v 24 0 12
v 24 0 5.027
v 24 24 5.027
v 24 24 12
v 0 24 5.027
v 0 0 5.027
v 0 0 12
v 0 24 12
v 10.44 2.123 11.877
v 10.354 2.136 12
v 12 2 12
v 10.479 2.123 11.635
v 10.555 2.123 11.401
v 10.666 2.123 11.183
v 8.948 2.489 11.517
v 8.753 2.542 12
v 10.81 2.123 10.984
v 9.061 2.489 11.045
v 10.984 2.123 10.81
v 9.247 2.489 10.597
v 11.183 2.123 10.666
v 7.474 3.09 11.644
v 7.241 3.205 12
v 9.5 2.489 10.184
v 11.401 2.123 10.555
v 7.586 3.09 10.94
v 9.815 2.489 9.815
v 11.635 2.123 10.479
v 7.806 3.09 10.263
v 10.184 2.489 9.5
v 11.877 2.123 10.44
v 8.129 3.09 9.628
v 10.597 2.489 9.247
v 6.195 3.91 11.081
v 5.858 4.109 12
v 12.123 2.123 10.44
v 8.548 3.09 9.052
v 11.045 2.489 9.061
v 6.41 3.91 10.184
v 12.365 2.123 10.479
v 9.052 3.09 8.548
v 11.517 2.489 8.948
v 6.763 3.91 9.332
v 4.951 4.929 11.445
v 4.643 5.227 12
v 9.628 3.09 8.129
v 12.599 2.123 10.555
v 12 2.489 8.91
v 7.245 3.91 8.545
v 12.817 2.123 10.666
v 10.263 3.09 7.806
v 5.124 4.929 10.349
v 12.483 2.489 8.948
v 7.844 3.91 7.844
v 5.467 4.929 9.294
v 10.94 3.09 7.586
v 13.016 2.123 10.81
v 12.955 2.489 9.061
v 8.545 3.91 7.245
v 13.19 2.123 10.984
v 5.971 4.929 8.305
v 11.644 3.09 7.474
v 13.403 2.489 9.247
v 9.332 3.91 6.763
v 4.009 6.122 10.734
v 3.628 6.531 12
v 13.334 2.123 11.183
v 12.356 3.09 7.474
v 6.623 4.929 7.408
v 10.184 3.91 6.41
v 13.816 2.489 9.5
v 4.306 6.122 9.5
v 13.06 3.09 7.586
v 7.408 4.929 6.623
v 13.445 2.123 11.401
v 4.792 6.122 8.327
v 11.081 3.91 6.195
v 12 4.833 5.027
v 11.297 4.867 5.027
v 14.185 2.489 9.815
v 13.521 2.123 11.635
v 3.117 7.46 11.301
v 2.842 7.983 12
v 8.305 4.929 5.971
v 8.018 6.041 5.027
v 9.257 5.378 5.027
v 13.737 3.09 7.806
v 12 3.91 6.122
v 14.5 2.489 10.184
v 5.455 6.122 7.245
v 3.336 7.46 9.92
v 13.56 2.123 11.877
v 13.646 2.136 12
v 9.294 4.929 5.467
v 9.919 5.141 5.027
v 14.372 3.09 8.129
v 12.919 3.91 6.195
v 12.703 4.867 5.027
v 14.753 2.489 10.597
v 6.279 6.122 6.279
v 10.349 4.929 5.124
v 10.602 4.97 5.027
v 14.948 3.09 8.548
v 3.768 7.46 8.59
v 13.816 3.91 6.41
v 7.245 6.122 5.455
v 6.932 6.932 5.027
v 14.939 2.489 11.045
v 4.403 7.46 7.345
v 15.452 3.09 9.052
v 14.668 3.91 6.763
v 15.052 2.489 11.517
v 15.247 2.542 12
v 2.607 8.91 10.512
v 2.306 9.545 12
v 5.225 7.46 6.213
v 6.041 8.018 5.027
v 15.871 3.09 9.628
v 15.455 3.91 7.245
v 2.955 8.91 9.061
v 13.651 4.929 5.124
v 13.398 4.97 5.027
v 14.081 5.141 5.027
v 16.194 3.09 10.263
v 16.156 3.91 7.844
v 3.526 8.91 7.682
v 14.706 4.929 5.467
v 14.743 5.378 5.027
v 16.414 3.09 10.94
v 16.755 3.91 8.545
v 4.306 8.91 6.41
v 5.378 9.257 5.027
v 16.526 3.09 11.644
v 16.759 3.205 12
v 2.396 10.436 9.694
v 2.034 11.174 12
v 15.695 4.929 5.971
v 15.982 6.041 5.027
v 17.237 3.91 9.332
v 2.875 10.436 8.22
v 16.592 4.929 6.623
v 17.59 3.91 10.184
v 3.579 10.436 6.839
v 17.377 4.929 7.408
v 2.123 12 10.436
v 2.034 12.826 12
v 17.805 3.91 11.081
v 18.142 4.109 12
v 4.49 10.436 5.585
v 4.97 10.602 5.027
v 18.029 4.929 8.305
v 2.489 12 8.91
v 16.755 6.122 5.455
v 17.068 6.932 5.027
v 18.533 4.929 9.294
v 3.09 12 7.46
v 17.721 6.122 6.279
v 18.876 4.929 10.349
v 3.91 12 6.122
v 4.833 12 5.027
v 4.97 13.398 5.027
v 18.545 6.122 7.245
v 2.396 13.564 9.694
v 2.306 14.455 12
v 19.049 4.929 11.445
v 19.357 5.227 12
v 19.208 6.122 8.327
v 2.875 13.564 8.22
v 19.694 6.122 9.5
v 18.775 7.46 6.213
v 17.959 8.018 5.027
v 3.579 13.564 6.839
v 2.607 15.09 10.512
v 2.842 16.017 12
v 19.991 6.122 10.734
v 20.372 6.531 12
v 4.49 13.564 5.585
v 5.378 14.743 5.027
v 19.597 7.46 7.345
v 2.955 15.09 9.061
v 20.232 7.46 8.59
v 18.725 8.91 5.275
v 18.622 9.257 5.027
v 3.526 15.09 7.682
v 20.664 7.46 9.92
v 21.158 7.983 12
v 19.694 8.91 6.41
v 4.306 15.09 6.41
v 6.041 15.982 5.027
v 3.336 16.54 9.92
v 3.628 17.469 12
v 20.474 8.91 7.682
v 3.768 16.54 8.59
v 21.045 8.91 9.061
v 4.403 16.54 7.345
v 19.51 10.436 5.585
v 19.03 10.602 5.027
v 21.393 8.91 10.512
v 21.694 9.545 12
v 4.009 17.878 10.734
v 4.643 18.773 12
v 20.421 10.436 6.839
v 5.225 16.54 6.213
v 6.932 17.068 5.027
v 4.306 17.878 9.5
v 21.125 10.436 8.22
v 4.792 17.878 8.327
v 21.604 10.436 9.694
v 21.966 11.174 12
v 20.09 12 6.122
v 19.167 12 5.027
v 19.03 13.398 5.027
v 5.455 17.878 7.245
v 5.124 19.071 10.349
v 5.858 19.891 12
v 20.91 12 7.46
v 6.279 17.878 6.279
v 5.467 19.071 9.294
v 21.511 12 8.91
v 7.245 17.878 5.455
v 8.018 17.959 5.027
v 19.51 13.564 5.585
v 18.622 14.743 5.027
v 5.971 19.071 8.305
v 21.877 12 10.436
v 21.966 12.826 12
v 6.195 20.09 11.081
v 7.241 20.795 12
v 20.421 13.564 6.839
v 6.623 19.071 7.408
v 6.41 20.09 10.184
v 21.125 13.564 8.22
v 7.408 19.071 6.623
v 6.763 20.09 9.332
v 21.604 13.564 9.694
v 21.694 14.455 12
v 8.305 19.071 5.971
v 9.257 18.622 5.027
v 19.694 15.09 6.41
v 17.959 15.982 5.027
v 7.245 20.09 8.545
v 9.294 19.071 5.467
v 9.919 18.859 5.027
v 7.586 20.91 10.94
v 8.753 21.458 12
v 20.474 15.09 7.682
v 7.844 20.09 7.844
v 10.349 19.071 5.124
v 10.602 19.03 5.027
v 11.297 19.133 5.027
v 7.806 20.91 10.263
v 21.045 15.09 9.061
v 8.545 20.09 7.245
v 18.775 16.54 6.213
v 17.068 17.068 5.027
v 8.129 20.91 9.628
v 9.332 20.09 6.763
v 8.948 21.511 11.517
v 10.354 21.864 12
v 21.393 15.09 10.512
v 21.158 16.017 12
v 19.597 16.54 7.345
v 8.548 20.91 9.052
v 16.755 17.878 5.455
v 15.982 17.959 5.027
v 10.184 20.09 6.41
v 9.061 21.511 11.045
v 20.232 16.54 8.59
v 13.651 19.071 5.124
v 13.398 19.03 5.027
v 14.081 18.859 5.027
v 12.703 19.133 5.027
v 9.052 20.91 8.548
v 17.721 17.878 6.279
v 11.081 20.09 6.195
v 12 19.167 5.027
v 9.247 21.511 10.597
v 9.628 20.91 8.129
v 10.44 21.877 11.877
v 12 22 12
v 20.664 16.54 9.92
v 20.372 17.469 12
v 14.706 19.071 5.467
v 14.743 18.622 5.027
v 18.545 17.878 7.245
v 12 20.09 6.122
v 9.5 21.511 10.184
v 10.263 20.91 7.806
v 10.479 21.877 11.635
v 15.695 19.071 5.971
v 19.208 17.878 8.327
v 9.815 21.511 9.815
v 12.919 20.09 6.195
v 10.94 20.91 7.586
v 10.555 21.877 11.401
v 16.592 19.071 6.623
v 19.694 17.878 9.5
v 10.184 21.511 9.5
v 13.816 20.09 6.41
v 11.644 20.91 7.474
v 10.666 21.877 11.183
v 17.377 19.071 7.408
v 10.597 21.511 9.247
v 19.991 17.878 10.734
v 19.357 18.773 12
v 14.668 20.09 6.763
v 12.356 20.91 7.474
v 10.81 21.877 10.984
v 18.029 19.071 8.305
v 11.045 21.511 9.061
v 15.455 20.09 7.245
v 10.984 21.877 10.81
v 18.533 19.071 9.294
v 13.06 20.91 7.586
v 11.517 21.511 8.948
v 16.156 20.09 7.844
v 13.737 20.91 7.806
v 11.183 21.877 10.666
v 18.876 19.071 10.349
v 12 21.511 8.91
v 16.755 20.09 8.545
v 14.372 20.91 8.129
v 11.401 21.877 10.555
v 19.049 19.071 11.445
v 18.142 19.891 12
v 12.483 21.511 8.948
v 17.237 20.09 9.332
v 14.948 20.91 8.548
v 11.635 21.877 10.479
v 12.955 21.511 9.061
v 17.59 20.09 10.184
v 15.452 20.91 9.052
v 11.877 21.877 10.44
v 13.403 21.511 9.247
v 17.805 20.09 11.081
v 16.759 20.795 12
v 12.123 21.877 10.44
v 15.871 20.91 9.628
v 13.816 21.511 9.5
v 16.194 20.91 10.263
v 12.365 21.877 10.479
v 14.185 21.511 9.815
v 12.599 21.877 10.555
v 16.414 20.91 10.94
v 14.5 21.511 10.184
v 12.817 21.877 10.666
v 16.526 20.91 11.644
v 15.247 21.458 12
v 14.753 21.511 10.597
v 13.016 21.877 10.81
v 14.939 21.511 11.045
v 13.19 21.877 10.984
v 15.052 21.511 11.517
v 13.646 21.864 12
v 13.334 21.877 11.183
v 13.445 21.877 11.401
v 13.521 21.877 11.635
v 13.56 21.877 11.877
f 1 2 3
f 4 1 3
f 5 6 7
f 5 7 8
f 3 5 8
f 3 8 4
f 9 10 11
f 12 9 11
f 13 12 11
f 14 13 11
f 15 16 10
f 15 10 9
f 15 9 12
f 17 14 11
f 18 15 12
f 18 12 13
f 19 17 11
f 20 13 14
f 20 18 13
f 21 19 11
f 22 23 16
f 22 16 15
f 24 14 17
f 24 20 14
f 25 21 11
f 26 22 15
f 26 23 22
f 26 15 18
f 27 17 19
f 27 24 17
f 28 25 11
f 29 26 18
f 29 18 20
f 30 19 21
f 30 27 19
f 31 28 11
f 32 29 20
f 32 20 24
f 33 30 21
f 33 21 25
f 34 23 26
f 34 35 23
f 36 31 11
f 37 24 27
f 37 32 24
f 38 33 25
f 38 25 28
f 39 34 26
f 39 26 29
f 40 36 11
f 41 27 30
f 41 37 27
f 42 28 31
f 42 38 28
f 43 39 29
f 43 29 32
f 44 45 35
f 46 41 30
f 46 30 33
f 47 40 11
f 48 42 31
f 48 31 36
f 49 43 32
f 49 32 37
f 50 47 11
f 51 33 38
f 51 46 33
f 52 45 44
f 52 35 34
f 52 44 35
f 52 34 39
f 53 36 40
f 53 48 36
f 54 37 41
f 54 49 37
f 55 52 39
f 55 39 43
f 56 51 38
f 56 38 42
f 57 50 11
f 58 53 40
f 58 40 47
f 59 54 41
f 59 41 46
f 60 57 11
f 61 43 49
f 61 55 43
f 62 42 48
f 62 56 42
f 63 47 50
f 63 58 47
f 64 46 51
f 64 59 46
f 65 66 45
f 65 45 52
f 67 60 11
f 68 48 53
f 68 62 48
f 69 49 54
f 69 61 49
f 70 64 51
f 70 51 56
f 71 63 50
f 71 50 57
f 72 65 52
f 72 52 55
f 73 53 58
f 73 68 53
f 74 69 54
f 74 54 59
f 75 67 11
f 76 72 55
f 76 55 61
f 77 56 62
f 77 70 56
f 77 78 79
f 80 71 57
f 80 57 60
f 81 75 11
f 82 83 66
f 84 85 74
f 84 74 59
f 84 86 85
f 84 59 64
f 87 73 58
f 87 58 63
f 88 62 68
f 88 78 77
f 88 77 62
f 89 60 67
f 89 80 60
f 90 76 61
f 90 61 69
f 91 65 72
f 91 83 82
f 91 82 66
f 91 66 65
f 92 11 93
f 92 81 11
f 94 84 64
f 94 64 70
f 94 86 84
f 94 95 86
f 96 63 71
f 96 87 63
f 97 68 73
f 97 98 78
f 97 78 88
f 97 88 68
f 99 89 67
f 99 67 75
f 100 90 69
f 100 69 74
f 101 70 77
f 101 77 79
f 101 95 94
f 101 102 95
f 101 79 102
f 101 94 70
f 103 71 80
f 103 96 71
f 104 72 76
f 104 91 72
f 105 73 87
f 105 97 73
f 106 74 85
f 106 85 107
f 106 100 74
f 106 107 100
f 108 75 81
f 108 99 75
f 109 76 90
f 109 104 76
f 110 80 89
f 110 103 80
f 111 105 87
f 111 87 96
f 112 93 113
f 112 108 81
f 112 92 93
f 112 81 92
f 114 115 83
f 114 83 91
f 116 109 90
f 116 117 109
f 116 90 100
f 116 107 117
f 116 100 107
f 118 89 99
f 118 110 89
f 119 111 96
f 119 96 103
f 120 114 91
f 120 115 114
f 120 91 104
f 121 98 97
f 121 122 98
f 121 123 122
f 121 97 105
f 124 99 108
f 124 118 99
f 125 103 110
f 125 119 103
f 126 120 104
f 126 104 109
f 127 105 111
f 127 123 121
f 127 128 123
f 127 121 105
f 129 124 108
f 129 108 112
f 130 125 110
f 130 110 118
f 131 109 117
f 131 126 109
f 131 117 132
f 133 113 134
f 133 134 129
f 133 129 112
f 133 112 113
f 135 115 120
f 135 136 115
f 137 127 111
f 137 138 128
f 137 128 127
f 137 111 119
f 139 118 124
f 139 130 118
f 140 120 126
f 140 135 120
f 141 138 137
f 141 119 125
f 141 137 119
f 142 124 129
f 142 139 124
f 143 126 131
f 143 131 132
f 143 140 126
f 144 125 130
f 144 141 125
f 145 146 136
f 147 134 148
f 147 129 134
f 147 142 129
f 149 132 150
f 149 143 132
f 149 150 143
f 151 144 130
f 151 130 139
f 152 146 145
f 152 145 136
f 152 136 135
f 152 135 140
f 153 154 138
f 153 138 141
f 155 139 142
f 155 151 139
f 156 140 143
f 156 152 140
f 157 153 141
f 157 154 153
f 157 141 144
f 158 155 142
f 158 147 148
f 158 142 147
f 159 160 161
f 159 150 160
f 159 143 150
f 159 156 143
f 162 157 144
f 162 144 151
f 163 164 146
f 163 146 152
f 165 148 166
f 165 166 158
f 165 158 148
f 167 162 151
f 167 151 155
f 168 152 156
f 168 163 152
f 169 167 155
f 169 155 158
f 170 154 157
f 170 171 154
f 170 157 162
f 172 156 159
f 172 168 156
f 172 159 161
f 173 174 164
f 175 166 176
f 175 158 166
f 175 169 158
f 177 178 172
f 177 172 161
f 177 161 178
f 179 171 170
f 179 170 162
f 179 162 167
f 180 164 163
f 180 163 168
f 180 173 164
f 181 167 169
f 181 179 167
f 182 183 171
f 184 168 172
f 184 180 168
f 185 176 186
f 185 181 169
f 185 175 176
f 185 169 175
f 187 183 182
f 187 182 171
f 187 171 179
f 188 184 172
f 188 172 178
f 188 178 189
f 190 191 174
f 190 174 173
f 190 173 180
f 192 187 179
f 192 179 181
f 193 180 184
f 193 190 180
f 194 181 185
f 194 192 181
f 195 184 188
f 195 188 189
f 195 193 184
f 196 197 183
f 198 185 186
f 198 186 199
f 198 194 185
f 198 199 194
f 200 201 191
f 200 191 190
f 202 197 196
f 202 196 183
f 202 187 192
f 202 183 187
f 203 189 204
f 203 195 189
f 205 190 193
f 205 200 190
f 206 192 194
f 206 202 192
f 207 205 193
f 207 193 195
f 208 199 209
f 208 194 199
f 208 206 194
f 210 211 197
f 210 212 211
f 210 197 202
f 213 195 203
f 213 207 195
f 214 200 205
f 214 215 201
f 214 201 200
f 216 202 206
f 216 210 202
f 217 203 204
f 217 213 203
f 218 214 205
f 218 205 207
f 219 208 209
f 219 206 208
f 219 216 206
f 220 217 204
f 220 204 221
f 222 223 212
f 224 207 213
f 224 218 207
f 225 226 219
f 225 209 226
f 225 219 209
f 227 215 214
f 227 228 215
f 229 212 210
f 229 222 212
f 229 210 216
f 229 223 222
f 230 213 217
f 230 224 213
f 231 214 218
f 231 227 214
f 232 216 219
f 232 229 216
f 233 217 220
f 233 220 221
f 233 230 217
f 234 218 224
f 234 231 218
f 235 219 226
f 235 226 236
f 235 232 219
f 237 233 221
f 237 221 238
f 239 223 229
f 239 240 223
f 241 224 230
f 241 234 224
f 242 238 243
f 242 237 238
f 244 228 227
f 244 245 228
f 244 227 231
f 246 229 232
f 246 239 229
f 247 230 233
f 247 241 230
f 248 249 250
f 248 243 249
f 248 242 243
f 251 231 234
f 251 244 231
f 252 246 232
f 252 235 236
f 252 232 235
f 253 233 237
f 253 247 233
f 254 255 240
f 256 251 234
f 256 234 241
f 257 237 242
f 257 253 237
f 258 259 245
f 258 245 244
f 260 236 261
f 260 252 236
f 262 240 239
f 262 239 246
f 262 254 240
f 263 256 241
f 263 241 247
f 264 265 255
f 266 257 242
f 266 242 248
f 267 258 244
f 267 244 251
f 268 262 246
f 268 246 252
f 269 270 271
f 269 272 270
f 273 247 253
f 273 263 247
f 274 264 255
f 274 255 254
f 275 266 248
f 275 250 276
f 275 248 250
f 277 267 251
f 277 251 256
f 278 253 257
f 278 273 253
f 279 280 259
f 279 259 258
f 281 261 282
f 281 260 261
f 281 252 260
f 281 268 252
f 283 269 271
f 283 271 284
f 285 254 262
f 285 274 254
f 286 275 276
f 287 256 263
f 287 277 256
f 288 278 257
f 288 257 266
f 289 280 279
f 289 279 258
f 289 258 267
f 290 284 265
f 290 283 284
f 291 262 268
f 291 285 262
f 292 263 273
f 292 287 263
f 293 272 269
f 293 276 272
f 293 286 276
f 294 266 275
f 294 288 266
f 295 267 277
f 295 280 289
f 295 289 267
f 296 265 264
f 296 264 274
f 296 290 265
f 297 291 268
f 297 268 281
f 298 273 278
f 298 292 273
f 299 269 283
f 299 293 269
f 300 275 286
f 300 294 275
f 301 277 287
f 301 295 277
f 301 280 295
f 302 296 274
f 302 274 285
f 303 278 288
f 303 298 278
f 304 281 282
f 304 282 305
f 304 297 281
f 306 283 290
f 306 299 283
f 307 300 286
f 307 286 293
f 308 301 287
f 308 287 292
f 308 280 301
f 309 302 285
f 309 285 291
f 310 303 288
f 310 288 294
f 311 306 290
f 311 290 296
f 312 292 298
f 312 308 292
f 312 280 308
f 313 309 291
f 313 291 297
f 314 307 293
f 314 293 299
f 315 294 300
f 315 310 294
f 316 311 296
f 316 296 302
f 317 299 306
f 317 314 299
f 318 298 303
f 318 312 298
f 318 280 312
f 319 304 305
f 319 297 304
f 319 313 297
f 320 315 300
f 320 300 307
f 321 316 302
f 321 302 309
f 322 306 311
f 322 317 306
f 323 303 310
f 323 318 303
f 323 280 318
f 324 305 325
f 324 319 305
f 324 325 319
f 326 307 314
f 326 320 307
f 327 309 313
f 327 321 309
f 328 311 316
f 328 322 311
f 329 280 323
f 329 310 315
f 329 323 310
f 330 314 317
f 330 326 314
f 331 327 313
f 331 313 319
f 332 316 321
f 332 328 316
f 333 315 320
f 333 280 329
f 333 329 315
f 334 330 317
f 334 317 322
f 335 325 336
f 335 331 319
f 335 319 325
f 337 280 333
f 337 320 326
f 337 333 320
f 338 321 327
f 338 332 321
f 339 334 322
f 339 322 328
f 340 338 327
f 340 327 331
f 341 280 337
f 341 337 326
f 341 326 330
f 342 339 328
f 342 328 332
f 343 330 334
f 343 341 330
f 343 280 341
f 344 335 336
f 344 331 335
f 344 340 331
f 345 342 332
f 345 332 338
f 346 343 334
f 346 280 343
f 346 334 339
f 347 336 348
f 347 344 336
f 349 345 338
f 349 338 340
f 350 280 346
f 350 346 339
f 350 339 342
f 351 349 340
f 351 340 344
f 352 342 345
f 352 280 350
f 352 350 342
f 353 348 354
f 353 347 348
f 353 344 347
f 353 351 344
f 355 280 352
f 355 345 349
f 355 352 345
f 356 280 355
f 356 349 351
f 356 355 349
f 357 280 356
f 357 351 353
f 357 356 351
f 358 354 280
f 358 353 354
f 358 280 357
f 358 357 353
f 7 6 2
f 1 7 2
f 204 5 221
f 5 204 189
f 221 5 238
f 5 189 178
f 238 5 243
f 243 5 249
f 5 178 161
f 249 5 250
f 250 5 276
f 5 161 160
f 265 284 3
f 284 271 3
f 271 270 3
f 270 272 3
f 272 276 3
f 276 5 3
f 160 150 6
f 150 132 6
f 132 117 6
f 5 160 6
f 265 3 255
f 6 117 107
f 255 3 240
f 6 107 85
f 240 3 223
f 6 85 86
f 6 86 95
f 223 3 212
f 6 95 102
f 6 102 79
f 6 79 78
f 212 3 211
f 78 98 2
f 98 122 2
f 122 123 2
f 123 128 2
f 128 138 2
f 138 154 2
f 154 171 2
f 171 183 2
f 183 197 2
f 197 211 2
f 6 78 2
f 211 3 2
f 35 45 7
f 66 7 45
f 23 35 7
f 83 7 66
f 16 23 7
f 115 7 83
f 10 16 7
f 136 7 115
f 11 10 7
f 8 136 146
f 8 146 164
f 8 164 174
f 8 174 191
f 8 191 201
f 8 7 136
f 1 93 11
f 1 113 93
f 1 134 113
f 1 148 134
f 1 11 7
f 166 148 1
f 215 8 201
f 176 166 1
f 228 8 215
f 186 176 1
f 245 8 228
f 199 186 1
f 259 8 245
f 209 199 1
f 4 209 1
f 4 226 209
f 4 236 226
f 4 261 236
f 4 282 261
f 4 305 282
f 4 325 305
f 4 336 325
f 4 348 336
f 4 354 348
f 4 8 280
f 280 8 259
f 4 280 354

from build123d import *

# Parameters (mm, degrees)
SKETCH2_W           = 24
SKETCH2_H           = 24
BOSS_EXTRUDE1_DEPTH = 12
CUT_EXTRUDE1_DEPTH  = 37


with BuildPart() as part:
    # Sketch2 → Boss-Extrude1 (new body)
    with BuildSketch(Plane.XY):
        with Locations((12, 12)):
            Rectangle(SKETCH2_W, SKETCH2_H)
    extrude(amount=BOSS_EXTRUDE1_DEPTH)

    # Sketch4 → Cut-Revolve1 (revolve, cut)
    with BuildSketch(Plane.XY.offset(12)):
        with BuildLine():
            Line((12, 22), (12, 2))
            ThreePointArc((12, 2), (2, 12), (12, 22))
        make_face()
    revolve(axis=Axis((12, 22, 12), (0, -1, 0)), mode=Mode.SUBTRACT)

    # Sketch6 → Cut-Extrude1 (cut, through all)
    with BuildSketch(Plane(origin=(24, 0, 0), x_dir=(0, 0, -1), z_dir=(1, 0, 0))):
        Polygon((0, 24), (-3.026616613, 24), (-5.026616613, 24), (-5.026616613, 0), (-3.026616613, 0), (0, 0), align=None)
    extrude(amount=-CUT_EXTRUDE1_DEPTH, mode=Mode.SUBTRACT)


solid = part.part
